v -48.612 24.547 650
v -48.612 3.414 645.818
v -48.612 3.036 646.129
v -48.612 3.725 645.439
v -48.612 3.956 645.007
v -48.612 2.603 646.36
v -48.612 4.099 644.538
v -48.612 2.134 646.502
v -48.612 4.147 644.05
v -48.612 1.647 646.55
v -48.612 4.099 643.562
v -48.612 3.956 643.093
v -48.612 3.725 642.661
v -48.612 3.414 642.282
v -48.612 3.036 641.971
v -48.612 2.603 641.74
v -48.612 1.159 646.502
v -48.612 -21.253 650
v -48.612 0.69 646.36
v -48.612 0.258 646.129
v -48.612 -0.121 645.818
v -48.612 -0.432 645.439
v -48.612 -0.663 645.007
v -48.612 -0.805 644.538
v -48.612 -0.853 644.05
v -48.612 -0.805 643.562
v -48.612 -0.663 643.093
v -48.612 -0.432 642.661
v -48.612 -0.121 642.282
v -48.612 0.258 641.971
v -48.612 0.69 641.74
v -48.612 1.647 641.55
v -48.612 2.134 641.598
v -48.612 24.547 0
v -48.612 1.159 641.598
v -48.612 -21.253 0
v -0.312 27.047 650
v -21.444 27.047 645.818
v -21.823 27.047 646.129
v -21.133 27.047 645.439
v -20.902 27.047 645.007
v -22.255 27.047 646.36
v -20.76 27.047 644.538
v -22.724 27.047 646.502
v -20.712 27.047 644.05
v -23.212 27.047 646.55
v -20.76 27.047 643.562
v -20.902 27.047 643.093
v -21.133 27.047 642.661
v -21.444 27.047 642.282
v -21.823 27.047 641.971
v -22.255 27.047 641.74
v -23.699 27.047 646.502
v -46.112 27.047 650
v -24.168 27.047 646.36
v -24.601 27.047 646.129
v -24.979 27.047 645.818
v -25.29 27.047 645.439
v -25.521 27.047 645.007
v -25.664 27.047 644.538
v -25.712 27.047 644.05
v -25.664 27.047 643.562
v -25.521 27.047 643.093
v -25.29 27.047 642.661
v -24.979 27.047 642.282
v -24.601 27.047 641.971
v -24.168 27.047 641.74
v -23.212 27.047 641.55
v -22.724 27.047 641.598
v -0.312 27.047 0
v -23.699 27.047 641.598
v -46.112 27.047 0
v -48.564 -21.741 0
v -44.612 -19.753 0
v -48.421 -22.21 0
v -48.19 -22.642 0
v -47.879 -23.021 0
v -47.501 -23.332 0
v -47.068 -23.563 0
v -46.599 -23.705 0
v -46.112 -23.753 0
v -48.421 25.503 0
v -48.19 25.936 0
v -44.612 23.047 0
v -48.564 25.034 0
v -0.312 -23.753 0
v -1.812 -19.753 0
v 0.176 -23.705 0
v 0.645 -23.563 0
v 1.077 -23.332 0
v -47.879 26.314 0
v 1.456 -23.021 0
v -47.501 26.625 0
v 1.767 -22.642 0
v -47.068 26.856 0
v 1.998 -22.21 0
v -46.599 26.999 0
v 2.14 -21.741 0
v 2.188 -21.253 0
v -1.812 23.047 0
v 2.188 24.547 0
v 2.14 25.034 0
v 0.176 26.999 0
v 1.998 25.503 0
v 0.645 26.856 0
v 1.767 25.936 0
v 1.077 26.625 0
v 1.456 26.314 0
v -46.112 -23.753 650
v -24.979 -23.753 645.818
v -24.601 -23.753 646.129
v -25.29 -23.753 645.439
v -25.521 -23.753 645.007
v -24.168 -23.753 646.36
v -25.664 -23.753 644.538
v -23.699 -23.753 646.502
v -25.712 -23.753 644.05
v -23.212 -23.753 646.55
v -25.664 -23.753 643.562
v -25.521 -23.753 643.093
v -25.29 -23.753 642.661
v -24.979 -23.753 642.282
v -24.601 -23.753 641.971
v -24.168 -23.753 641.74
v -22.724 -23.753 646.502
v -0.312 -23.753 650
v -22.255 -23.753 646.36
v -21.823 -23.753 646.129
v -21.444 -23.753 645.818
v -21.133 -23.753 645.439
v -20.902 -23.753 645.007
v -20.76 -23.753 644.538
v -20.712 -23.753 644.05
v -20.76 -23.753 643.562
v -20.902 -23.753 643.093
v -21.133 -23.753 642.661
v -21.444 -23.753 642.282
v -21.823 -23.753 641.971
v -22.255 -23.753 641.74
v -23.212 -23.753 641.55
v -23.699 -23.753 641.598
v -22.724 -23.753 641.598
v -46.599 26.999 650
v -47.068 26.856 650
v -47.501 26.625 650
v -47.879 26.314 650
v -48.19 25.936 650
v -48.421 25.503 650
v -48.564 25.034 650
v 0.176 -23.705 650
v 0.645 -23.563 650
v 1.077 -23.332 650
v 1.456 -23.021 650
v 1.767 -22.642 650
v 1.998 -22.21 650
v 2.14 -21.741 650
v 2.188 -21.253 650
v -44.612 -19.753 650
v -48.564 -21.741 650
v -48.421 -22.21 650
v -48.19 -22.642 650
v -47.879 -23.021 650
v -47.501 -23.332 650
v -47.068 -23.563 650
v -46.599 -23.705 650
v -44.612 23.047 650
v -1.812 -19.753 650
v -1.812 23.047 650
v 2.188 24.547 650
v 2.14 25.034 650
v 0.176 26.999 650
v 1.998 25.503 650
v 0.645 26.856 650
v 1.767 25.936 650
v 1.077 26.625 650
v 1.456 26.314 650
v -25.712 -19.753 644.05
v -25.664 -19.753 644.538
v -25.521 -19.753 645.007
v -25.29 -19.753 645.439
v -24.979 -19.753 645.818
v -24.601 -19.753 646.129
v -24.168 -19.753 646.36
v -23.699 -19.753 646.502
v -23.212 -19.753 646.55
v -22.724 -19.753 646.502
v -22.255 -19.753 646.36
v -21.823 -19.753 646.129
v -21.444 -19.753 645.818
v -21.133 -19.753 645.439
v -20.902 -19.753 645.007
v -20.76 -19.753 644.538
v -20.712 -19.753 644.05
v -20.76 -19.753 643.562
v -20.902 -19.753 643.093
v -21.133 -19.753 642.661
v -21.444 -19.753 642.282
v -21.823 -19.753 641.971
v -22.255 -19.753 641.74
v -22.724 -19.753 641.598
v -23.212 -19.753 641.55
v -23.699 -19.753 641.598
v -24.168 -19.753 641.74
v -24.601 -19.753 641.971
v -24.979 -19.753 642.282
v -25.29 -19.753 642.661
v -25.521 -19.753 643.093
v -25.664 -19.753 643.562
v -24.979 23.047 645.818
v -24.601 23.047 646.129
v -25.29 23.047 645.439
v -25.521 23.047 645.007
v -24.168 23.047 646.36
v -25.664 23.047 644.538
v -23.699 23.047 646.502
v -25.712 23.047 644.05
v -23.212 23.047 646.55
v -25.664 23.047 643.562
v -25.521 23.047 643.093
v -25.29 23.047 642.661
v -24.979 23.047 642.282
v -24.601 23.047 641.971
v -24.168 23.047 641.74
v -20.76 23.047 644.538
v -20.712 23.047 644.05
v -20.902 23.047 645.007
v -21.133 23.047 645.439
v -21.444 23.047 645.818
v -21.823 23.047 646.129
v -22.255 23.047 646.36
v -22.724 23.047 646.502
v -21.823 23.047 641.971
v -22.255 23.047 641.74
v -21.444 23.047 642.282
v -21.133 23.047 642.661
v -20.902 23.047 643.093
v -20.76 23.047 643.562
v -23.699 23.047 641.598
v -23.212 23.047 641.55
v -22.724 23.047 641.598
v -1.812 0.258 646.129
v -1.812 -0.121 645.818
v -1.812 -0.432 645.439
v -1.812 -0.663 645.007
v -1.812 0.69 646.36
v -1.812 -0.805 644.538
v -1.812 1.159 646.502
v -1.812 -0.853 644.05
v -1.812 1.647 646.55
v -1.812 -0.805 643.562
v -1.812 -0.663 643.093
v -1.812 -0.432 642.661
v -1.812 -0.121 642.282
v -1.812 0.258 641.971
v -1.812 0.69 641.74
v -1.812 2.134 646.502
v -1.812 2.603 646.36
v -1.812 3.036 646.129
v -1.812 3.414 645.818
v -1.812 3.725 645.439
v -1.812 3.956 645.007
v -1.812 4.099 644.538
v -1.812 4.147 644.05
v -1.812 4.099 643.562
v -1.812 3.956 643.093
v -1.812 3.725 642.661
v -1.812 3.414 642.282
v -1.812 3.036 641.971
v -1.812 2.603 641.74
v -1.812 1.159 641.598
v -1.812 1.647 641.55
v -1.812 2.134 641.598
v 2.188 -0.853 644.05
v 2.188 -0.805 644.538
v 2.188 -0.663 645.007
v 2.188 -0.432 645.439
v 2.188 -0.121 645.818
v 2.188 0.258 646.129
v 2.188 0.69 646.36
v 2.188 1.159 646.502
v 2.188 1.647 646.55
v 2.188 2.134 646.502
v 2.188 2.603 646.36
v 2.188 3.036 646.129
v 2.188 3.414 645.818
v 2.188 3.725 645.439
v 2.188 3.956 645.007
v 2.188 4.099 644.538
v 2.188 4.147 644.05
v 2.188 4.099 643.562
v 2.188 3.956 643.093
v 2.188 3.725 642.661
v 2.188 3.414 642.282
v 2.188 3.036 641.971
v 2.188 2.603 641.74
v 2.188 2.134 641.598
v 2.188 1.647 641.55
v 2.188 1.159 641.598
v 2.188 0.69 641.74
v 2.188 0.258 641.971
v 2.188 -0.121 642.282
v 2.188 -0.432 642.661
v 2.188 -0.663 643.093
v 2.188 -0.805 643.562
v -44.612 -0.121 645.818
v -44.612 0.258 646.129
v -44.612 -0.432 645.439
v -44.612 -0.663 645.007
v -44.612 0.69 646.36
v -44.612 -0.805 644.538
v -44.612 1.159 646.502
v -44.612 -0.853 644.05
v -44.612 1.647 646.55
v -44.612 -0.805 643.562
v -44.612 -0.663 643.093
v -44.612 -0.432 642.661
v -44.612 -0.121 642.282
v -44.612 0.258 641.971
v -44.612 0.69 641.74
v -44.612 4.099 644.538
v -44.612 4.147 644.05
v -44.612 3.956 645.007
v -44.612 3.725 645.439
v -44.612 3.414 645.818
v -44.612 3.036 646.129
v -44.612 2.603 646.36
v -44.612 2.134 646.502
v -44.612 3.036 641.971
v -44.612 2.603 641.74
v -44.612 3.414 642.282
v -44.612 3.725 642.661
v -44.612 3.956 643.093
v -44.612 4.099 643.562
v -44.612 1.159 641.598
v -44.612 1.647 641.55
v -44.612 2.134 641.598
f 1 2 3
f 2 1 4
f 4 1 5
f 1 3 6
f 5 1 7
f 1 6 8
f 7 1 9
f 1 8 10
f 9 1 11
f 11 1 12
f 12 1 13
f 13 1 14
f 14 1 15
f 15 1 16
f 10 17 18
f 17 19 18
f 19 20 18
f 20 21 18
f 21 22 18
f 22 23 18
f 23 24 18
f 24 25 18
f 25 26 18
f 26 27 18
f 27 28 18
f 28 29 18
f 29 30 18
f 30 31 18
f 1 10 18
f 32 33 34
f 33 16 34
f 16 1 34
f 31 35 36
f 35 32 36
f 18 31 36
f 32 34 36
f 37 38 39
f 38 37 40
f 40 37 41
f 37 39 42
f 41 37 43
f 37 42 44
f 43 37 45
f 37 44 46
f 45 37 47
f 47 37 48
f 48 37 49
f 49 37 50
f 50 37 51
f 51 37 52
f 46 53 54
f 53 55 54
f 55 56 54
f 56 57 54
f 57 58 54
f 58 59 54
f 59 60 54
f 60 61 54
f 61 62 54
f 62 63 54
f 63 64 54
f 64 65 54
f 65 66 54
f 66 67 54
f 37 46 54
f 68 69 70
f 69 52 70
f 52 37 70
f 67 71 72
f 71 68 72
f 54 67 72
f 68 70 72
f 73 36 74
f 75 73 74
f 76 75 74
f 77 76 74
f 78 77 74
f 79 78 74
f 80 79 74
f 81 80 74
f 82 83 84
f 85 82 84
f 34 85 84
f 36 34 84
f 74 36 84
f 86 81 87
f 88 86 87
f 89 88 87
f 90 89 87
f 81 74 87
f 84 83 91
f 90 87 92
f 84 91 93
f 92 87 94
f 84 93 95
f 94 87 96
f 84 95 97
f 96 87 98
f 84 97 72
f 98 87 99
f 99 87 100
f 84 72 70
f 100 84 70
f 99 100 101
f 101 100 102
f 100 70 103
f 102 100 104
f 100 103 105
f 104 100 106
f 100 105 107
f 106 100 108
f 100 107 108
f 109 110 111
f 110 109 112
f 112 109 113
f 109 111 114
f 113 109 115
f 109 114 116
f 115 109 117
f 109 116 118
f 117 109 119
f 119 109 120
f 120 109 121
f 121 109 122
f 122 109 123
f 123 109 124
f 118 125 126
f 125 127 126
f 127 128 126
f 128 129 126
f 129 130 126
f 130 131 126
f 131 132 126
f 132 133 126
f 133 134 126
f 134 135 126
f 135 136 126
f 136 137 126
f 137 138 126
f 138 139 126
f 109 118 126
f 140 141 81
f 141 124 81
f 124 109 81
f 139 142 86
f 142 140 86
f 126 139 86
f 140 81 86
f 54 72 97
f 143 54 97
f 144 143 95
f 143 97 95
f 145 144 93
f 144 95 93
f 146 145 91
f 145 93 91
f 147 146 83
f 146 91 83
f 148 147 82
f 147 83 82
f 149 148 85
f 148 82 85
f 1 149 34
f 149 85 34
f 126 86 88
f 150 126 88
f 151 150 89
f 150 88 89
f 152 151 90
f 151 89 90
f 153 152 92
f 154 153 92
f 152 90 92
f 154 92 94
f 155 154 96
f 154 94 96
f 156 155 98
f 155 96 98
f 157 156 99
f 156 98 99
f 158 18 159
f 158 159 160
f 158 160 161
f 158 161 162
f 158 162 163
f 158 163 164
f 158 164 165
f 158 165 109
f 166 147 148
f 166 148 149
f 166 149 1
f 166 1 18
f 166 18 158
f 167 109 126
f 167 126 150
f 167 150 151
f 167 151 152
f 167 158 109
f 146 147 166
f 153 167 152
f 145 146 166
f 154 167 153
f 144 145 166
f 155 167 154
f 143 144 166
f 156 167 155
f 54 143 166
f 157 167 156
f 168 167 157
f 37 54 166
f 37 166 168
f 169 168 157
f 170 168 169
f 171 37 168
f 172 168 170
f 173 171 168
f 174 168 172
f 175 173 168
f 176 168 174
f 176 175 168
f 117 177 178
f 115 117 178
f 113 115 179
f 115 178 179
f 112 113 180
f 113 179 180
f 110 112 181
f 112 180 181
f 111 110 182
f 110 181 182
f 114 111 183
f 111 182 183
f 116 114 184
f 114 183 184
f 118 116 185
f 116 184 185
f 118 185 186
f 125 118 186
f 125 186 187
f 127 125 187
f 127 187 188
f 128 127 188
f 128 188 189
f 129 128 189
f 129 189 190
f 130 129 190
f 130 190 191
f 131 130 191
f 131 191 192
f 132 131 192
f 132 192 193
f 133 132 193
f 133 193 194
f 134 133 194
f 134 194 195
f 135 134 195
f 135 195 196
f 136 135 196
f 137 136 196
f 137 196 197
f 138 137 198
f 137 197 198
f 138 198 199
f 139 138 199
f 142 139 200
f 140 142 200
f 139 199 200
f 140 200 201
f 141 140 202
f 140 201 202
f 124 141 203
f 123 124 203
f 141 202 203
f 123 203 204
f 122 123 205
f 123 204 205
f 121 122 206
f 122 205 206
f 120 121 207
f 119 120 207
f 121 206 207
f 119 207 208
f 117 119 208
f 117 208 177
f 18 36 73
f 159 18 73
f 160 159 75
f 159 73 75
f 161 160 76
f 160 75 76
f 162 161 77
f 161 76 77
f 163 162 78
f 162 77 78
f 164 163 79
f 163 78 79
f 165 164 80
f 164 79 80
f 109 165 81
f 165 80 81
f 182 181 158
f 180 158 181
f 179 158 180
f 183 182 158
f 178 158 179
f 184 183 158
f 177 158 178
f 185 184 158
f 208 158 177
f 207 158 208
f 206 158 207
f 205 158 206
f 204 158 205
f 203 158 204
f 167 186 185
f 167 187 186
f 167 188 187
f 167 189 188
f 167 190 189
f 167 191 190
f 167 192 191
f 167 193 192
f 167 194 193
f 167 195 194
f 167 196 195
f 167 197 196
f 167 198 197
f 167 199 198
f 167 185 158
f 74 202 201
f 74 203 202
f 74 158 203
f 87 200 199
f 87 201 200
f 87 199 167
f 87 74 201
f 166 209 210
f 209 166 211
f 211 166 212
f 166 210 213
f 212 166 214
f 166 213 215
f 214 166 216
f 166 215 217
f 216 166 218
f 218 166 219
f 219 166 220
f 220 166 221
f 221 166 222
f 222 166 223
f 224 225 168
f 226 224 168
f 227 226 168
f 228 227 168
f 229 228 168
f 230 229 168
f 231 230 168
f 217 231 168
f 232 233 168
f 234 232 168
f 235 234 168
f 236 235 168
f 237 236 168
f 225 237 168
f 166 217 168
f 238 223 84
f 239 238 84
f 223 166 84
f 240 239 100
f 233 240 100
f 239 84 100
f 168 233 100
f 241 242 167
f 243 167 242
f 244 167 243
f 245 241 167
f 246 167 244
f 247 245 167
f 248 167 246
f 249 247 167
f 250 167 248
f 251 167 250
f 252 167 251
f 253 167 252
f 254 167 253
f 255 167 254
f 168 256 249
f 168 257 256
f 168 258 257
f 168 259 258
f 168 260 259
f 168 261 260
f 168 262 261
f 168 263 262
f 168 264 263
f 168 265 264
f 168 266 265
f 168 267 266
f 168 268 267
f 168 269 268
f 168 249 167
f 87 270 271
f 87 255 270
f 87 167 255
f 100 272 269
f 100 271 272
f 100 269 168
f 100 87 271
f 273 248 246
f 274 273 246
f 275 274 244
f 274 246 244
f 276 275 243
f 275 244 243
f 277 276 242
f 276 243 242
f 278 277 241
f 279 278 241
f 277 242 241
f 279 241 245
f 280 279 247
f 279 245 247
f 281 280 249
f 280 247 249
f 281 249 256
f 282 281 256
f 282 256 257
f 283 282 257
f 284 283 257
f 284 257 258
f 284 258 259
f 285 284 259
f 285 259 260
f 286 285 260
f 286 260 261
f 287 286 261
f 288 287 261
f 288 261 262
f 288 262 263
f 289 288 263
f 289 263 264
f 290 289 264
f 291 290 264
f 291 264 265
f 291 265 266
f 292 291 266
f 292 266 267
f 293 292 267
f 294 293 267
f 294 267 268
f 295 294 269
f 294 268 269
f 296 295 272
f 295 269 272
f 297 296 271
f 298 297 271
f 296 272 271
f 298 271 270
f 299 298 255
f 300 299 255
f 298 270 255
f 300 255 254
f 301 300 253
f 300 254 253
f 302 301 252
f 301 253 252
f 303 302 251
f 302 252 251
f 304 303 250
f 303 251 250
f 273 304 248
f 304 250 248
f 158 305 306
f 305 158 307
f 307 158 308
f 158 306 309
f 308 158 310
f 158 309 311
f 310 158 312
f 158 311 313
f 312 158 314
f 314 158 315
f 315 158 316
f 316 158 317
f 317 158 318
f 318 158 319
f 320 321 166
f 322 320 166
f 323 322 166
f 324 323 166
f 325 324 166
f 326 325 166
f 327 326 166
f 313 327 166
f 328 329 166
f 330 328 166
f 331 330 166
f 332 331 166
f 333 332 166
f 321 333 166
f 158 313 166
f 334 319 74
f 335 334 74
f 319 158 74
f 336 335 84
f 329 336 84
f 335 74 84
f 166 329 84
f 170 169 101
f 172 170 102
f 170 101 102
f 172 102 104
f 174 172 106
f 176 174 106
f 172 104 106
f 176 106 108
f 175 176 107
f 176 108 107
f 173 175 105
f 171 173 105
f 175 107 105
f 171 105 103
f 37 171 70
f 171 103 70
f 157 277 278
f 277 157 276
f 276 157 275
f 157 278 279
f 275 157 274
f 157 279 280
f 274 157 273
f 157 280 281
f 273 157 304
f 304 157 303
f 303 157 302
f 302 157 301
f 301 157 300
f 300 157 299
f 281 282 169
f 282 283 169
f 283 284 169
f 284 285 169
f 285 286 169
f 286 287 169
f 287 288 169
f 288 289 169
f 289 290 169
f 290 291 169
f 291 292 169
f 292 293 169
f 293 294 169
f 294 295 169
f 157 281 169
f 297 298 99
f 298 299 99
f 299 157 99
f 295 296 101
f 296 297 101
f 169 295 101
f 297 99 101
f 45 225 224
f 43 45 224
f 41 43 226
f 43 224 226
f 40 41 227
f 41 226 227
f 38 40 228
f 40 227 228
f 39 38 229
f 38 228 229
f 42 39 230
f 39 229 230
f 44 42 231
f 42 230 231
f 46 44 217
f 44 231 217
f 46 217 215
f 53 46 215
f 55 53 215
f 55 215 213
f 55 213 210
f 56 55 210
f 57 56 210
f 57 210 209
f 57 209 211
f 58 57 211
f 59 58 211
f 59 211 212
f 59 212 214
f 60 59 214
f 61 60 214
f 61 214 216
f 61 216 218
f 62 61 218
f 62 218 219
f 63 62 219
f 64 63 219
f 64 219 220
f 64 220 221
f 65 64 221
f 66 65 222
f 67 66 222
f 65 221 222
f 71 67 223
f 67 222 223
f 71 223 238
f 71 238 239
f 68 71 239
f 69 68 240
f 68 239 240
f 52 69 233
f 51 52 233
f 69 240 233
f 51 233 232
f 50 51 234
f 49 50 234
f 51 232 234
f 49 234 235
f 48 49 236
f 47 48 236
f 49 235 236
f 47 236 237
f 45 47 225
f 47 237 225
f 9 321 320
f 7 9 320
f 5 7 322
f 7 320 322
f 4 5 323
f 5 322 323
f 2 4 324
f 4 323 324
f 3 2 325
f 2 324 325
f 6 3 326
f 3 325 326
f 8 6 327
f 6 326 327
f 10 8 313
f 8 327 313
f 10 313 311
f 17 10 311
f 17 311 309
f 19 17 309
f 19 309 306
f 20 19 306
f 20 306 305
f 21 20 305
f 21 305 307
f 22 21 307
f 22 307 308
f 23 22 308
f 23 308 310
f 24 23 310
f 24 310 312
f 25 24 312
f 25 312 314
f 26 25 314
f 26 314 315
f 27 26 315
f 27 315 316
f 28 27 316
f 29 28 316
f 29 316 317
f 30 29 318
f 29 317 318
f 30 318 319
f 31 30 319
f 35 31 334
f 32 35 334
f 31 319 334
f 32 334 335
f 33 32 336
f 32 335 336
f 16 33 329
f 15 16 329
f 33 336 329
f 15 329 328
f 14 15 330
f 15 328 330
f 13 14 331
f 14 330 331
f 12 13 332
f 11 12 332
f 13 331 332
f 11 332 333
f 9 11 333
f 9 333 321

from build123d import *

# Parameters (mm, degrees)
F0_W            = 42.8
F0_H            = 42.8
F1_DEPTH        = 650
F3_D            = 5
F3_DEPTH        = 15
F3_TIP          = 1.5021515476
F3_COPIES_COUNT = 4


# Not quite as in the source:
# - a pattern or mirror of a feature is missing from the dataset's text; its kind, count and spacing are read off the source's solid


with BuildPart() as f1:
    # F0 (on Top) → F1 (new body)
    with BuildSketch(Plane.XY):
        with BuildLine():
            Line((-0.3117055804, 27.0466537178), (-46.1117055804, 27.0466537178))
            ThreePointArc((-46.1117055804, 27.0466537178), (-47.8794725333, 26.3144206707), (-48.6117055804, 24.5466537178))
            Line((-48.6117055804, 24.5466537178), (-48.6117055804, -21.2533462822))
            ThreePointArc((-48.6117055804, -21.2533462822), (-47.8794725333, -23.0211132352), (-46.1117055804, -23.7533462822))
            Line((-46.1117055804, -23.7533462822), (-0.3117055804, -23.7533462822))
            ThreePointArc((-0.3117055804, -23.7533462822), (1.4560613726, -23.0211132352), (2.1882944196, -21.2533462822))
            Line((2.1882944196, -21.2533462822), (2.1882944196, 24.5466537178))
            ThreePointArc((2.1882944196, 24.5466537178), (1.4560613726, 26.3144206707), (-0.3117055804, 27.0466537178))
        make_face()
        with Locations((-23.2117055804, 1.6466537178)):
            Rectangle(F0_W, F0_H, mode=Mode.SUBTRACT)
    extrude(amount=F1_DEPTH)

    # F3
    with Locations(Plane.XZ.offset(23.7533462822)):
        with Locations((-23.2117055804, 644.05)):
            f3 = Hole(F3_D / 2, depth=F3_DEPTH)
            with Locations((0, 0, -(F3_DEPTH + F3_TIP / 2))):  # 118° drill point
                Cone(0, F3_D / 2, F3_TIP, mode=Mode.SUBTRACT)

    # F3_copies: F3 ×4 about axis
    f3_copies_axis = Axis((-23.211706, 1.646654, 0), (0, 0, 1))
    for i in range(1, F3_COPIES_COUNT):
        add(f3.rotate(f3_copies_axis, i * 360 / F3_COPIES_COUNT), mode=Mode.SUBTRACT)


solid = f1.part
